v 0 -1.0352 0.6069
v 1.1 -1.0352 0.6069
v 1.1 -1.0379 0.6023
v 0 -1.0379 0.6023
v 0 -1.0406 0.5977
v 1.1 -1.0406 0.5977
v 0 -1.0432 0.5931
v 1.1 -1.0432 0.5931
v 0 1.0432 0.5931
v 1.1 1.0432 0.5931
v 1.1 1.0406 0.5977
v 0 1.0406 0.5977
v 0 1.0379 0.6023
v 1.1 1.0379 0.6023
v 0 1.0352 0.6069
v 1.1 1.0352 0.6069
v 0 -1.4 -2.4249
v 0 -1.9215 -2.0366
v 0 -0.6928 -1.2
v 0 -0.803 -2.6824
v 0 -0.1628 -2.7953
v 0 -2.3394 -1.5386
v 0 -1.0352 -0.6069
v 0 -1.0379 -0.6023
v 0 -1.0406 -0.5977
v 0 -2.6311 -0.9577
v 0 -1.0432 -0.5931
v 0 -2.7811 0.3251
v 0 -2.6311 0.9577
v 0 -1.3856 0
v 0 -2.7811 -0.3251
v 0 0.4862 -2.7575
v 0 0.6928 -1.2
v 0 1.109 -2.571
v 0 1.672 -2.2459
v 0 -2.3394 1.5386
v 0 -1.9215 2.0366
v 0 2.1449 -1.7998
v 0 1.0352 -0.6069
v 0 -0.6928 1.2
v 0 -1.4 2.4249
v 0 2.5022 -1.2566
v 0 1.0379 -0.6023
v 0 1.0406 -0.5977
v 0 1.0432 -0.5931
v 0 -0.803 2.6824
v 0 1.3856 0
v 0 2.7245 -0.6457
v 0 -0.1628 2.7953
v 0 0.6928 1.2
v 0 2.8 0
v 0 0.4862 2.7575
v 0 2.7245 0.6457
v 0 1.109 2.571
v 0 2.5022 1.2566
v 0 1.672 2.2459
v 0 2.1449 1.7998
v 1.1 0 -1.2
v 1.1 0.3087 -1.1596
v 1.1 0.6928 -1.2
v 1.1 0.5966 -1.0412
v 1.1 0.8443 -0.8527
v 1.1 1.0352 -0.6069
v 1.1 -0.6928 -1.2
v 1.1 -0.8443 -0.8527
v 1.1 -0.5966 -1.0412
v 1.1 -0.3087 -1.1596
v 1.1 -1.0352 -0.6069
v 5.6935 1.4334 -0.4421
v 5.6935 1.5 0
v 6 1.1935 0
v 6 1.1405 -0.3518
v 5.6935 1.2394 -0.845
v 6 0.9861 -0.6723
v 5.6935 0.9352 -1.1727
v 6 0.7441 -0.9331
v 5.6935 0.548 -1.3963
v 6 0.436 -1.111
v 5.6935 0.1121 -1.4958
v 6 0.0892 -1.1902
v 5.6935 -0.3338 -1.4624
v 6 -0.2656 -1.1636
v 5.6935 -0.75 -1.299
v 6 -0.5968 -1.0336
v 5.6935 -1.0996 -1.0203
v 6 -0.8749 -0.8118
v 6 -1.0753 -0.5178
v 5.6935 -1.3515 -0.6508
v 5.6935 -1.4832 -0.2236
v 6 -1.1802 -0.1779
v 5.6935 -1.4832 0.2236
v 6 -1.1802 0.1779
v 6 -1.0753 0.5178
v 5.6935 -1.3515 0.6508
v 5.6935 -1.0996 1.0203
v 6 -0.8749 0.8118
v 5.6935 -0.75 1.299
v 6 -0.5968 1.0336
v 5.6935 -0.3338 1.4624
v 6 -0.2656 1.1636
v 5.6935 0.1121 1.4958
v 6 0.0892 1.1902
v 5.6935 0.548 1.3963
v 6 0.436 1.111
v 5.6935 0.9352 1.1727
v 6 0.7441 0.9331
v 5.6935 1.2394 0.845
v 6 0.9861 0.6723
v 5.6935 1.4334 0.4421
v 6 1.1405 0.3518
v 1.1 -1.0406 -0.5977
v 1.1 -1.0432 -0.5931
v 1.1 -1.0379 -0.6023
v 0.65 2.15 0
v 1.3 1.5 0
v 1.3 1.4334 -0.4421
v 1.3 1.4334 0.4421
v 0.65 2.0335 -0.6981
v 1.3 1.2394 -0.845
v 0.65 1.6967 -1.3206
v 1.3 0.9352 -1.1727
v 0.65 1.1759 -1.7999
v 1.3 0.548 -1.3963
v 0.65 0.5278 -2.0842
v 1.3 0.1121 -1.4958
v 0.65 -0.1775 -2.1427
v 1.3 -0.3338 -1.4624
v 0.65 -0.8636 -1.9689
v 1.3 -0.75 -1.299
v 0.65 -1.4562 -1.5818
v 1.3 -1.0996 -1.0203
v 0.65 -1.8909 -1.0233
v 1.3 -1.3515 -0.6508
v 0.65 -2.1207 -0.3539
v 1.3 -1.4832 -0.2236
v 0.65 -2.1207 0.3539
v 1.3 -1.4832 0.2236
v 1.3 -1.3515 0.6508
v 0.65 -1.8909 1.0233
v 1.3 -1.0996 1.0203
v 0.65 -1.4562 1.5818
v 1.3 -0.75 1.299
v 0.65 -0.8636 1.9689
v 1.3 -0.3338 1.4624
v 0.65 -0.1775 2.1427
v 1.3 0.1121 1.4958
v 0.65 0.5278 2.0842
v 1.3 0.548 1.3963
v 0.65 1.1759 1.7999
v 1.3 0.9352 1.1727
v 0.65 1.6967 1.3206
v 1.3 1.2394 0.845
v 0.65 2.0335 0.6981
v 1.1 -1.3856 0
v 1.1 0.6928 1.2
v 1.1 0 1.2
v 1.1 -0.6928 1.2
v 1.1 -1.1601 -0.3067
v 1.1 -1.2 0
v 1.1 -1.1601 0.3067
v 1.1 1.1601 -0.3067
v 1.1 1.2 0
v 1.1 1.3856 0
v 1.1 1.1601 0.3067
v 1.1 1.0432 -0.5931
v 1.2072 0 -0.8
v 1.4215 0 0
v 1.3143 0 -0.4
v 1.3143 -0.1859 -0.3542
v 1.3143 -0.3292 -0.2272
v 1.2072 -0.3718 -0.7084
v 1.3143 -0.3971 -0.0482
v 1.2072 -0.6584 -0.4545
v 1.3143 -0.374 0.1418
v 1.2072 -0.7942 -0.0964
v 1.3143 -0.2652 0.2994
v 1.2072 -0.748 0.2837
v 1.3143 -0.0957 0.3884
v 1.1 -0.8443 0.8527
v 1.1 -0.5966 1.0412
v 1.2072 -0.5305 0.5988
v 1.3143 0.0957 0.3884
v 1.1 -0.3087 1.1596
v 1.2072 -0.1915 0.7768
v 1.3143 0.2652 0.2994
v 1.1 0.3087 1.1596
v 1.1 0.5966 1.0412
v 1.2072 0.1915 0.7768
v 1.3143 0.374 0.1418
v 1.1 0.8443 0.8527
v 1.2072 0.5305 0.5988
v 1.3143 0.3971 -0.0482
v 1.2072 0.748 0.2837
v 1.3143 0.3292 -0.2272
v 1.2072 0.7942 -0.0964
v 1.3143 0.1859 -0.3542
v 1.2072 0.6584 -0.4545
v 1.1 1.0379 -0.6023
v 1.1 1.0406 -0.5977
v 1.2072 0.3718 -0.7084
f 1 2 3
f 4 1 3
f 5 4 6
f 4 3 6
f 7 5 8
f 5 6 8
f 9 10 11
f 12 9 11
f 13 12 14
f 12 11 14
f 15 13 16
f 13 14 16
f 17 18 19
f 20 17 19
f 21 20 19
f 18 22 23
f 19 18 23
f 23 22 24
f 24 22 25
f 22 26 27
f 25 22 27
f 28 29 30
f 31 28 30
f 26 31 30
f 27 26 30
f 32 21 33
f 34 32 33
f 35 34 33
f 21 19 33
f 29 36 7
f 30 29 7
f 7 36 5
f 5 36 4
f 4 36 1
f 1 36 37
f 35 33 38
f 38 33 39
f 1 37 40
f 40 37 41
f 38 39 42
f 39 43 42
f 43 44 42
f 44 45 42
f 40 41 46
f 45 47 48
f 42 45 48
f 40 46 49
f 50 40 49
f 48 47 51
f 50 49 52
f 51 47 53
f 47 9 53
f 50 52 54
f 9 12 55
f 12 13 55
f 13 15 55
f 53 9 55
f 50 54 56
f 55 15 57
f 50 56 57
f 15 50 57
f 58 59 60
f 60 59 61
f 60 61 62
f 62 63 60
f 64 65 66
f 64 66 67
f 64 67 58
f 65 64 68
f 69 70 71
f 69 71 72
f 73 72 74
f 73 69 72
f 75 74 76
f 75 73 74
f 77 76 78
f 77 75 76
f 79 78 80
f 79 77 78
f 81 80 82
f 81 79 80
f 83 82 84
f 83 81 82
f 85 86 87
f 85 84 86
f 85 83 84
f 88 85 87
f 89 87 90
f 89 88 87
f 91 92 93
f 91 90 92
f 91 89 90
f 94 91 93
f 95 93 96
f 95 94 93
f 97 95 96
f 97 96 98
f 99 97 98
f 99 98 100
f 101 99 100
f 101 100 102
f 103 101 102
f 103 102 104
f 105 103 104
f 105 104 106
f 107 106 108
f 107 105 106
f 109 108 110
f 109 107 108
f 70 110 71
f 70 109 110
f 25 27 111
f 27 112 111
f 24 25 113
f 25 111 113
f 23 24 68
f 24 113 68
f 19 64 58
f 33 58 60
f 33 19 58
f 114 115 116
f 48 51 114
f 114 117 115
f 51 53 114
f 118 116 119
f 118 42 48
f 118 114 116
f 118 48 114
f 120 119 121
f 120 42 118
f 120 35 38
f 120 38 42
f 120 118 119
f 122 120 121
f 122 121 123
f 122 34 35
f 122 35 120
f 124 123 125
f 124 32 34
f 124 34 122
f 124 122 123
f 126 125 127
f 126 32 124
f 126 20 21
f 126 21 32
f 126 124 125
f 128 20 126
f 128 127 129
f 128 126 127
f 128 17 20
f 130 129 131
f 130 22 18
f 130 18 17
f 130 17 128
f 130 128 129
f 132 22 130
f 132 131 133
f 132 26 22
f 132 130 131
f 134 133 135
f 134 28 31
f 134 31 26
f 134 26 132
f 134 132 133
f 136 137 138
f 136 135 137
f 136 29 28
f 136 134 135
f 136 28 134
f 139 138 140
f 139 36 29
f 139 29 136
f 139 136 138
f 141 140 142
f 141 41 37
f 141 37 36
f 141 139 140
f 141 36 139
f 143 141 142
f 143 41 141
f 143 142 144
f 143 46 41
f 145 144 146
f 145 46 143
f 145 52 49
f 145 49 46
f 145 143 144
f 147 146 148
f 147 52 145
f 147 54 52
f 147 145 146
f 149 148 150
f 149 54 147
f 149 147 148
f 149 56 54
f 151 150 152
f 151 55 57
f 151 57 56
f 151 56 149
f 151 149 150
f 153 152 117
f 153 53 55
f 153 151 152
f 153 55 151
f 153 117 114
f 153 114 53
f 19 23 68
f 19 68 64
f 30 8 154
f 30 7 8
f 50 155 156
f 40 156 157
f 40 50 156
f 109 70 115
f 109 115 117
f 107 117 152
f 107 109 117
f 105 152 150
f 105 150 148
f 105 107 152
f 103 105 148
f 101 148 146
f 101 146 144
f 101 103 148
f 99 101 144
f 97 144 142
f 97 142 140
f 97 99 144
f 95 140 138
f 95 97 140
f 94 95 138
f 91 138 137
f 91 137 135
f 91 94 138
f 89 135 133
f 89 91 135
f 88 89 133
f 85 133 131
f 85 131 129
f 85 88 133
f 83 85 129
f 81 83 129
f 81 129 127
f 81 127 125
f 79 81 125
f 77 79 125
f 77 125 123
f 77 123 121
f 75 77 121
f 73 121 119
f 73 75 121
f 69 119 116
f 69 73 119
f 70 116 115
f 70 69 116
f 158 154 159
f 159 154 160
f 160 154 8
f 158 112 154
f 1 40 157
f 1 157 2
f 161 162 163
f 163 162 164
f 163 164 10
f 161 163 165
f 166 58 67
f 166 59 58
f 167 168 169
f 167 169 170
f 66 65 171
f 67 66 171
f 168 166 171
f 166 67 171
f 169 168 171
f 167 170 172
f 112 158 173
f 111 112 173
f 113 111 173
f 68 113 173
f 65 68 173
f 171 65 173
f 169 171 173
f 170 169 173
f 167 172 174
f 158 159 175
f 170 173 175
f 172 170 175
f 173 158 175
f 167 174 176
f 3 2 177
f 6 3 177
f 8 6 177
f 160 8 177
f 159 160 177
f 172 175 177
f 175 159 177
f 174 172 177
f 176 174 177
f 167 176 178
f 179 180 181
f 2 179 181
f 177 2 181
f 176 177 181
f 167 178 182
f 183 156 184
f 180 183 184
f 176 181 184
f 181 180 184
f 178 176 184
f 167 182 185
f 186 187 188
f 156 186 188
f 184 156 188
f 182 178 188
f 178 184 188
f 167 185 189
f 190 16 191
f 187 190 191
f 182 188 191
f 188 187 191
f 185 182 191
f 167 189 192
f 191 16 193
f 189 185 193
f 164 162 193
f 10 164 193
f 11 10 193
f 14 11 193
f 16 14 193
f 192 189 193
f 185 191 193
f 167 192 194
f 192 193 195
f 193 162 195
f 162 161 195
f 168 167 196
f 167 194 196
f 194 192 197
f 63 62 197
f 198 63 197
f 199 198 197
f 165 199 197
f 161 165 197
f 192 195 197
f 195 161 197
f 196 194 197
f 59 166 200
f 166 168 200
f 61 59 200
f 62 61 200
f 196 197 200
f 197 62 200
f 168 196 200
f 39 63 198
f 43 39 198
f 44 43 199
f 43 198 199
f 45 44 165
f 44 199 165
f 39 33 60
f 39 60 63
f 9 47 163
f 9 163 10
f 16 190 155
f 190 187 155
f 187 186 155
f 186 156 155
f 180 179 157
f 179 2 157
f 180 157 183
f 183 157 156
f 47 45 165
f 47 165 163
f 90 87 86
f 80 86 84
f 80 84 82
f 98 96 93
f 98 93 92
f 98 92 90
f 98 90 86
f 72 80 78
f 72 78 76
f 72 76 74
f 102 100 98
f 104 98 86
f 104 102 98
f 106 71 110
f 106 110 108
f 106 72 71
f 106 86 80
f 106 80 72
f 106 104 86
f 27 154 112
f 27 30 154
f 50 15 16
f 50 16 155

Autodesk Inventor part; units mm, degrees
sketch "Sketch_8" plane through (0, 0, 0) normal (0, 0, 1) x (1, 0, 0)
  line L0 (6, 0) -> (0, 0)
  line L1 (0, 0) -> (0, 2.8)
  line L2 (0, 2.8) -> (1.3, 1.5)
  line L3 (1.3, 1.5) -> (5.6935, 1.5)
  line L4 (5.6935, 1.5) -> (6, 1.1935)
  line L5 (6, 1.1935) -> (6, 0)
  line L6 (6, 0) -> (0, 0)
revolve "Revolution1" add sketch "Sketch_8" angle 360 about axis through (6, 0, 0) along (1, 0, 0)
thread "Thread1" size "M3x0.5" class "6g" standard "ISO Metric profile" length 3.25 offset 1.45
sketch "Sketch_9" plane through (0, 0, 0) normal (0, 1, 0) x (-1, 0, 0)
  line L0 (-1.4215, 0) -> (0, 0)
  line L1 (0, 0) -> (0, -1.2)
  line L2 (0, -1.2) -> (-1.1, -1.2)
  line L3 (-1.1, -1.2) -> (-1.4215, 0)
  line L4 (-1.4215, 0) -> (0, 0)
revolve "Revolution2" cut sketch "Sketch_9" angle 360 about axis through (1.4215, 0, 0) along (1, 0, 0)
sketch "Sketch_10" plane through (0, 0, 0) normal (1, 0, 0) x (0, 1, 0)
  line L0 (0.6928, 1.2) -> (-0.6928, 1.2)
  line L1 (-0.6928, 1.2) -> (-1.3856, 0)
  line L2 (-1.3856, 0) -> (-0.6928, -1.2)
  line L3 (-0.6928, -1.2) -> (0.6928, -1.2)
  line L4 (0.6928, -1.2) -> (1.3856, 0)
  line L5 (1.3856, 0) -> (0.6928, 1.2)
extrude "Extrusion1" cut sketch "Sketch_10" along normal blind 1.1
ref_plane "screw_XY" through (5.5, 0, 0) normal (1, 0, 0) x (0, 0, -1)
ref_plane "screw_YZ" through (5.5, 0, 0) normal (0, 0, -1) x (0, 1, 0)
ref_plane "screw_ZX" through (5.5, 0, 0) normal (0, 1, 0) x (1, 0, 0)
ref_plane "to_nut_XY" through (6, 0, 0) normal (1, 0, 0) x (0, 0, -1)
ref_plane "to_nut_YZ" through (6, 0, 0) normal (0, 0, -1) x (0, 1, 0)
ref_plane "to_nut_ZX" through (6, 0, 0) normal (0, 1, 0) x (1, 0, 0)
ref_plane "xx_XY" through (0.8, 0, 0) normal (1, 0, 0) x (0, 0, -1)
ref_plane "xx_YZ" through (0.8, 0, 0) normal (0, 0, -1) x (0, 1, 0)
ref_plane "xx_ZX" through (0.8, 0, 0) normal (0, 1, 0) x (1, 0, 0)
properties part number "FB3-6s"
